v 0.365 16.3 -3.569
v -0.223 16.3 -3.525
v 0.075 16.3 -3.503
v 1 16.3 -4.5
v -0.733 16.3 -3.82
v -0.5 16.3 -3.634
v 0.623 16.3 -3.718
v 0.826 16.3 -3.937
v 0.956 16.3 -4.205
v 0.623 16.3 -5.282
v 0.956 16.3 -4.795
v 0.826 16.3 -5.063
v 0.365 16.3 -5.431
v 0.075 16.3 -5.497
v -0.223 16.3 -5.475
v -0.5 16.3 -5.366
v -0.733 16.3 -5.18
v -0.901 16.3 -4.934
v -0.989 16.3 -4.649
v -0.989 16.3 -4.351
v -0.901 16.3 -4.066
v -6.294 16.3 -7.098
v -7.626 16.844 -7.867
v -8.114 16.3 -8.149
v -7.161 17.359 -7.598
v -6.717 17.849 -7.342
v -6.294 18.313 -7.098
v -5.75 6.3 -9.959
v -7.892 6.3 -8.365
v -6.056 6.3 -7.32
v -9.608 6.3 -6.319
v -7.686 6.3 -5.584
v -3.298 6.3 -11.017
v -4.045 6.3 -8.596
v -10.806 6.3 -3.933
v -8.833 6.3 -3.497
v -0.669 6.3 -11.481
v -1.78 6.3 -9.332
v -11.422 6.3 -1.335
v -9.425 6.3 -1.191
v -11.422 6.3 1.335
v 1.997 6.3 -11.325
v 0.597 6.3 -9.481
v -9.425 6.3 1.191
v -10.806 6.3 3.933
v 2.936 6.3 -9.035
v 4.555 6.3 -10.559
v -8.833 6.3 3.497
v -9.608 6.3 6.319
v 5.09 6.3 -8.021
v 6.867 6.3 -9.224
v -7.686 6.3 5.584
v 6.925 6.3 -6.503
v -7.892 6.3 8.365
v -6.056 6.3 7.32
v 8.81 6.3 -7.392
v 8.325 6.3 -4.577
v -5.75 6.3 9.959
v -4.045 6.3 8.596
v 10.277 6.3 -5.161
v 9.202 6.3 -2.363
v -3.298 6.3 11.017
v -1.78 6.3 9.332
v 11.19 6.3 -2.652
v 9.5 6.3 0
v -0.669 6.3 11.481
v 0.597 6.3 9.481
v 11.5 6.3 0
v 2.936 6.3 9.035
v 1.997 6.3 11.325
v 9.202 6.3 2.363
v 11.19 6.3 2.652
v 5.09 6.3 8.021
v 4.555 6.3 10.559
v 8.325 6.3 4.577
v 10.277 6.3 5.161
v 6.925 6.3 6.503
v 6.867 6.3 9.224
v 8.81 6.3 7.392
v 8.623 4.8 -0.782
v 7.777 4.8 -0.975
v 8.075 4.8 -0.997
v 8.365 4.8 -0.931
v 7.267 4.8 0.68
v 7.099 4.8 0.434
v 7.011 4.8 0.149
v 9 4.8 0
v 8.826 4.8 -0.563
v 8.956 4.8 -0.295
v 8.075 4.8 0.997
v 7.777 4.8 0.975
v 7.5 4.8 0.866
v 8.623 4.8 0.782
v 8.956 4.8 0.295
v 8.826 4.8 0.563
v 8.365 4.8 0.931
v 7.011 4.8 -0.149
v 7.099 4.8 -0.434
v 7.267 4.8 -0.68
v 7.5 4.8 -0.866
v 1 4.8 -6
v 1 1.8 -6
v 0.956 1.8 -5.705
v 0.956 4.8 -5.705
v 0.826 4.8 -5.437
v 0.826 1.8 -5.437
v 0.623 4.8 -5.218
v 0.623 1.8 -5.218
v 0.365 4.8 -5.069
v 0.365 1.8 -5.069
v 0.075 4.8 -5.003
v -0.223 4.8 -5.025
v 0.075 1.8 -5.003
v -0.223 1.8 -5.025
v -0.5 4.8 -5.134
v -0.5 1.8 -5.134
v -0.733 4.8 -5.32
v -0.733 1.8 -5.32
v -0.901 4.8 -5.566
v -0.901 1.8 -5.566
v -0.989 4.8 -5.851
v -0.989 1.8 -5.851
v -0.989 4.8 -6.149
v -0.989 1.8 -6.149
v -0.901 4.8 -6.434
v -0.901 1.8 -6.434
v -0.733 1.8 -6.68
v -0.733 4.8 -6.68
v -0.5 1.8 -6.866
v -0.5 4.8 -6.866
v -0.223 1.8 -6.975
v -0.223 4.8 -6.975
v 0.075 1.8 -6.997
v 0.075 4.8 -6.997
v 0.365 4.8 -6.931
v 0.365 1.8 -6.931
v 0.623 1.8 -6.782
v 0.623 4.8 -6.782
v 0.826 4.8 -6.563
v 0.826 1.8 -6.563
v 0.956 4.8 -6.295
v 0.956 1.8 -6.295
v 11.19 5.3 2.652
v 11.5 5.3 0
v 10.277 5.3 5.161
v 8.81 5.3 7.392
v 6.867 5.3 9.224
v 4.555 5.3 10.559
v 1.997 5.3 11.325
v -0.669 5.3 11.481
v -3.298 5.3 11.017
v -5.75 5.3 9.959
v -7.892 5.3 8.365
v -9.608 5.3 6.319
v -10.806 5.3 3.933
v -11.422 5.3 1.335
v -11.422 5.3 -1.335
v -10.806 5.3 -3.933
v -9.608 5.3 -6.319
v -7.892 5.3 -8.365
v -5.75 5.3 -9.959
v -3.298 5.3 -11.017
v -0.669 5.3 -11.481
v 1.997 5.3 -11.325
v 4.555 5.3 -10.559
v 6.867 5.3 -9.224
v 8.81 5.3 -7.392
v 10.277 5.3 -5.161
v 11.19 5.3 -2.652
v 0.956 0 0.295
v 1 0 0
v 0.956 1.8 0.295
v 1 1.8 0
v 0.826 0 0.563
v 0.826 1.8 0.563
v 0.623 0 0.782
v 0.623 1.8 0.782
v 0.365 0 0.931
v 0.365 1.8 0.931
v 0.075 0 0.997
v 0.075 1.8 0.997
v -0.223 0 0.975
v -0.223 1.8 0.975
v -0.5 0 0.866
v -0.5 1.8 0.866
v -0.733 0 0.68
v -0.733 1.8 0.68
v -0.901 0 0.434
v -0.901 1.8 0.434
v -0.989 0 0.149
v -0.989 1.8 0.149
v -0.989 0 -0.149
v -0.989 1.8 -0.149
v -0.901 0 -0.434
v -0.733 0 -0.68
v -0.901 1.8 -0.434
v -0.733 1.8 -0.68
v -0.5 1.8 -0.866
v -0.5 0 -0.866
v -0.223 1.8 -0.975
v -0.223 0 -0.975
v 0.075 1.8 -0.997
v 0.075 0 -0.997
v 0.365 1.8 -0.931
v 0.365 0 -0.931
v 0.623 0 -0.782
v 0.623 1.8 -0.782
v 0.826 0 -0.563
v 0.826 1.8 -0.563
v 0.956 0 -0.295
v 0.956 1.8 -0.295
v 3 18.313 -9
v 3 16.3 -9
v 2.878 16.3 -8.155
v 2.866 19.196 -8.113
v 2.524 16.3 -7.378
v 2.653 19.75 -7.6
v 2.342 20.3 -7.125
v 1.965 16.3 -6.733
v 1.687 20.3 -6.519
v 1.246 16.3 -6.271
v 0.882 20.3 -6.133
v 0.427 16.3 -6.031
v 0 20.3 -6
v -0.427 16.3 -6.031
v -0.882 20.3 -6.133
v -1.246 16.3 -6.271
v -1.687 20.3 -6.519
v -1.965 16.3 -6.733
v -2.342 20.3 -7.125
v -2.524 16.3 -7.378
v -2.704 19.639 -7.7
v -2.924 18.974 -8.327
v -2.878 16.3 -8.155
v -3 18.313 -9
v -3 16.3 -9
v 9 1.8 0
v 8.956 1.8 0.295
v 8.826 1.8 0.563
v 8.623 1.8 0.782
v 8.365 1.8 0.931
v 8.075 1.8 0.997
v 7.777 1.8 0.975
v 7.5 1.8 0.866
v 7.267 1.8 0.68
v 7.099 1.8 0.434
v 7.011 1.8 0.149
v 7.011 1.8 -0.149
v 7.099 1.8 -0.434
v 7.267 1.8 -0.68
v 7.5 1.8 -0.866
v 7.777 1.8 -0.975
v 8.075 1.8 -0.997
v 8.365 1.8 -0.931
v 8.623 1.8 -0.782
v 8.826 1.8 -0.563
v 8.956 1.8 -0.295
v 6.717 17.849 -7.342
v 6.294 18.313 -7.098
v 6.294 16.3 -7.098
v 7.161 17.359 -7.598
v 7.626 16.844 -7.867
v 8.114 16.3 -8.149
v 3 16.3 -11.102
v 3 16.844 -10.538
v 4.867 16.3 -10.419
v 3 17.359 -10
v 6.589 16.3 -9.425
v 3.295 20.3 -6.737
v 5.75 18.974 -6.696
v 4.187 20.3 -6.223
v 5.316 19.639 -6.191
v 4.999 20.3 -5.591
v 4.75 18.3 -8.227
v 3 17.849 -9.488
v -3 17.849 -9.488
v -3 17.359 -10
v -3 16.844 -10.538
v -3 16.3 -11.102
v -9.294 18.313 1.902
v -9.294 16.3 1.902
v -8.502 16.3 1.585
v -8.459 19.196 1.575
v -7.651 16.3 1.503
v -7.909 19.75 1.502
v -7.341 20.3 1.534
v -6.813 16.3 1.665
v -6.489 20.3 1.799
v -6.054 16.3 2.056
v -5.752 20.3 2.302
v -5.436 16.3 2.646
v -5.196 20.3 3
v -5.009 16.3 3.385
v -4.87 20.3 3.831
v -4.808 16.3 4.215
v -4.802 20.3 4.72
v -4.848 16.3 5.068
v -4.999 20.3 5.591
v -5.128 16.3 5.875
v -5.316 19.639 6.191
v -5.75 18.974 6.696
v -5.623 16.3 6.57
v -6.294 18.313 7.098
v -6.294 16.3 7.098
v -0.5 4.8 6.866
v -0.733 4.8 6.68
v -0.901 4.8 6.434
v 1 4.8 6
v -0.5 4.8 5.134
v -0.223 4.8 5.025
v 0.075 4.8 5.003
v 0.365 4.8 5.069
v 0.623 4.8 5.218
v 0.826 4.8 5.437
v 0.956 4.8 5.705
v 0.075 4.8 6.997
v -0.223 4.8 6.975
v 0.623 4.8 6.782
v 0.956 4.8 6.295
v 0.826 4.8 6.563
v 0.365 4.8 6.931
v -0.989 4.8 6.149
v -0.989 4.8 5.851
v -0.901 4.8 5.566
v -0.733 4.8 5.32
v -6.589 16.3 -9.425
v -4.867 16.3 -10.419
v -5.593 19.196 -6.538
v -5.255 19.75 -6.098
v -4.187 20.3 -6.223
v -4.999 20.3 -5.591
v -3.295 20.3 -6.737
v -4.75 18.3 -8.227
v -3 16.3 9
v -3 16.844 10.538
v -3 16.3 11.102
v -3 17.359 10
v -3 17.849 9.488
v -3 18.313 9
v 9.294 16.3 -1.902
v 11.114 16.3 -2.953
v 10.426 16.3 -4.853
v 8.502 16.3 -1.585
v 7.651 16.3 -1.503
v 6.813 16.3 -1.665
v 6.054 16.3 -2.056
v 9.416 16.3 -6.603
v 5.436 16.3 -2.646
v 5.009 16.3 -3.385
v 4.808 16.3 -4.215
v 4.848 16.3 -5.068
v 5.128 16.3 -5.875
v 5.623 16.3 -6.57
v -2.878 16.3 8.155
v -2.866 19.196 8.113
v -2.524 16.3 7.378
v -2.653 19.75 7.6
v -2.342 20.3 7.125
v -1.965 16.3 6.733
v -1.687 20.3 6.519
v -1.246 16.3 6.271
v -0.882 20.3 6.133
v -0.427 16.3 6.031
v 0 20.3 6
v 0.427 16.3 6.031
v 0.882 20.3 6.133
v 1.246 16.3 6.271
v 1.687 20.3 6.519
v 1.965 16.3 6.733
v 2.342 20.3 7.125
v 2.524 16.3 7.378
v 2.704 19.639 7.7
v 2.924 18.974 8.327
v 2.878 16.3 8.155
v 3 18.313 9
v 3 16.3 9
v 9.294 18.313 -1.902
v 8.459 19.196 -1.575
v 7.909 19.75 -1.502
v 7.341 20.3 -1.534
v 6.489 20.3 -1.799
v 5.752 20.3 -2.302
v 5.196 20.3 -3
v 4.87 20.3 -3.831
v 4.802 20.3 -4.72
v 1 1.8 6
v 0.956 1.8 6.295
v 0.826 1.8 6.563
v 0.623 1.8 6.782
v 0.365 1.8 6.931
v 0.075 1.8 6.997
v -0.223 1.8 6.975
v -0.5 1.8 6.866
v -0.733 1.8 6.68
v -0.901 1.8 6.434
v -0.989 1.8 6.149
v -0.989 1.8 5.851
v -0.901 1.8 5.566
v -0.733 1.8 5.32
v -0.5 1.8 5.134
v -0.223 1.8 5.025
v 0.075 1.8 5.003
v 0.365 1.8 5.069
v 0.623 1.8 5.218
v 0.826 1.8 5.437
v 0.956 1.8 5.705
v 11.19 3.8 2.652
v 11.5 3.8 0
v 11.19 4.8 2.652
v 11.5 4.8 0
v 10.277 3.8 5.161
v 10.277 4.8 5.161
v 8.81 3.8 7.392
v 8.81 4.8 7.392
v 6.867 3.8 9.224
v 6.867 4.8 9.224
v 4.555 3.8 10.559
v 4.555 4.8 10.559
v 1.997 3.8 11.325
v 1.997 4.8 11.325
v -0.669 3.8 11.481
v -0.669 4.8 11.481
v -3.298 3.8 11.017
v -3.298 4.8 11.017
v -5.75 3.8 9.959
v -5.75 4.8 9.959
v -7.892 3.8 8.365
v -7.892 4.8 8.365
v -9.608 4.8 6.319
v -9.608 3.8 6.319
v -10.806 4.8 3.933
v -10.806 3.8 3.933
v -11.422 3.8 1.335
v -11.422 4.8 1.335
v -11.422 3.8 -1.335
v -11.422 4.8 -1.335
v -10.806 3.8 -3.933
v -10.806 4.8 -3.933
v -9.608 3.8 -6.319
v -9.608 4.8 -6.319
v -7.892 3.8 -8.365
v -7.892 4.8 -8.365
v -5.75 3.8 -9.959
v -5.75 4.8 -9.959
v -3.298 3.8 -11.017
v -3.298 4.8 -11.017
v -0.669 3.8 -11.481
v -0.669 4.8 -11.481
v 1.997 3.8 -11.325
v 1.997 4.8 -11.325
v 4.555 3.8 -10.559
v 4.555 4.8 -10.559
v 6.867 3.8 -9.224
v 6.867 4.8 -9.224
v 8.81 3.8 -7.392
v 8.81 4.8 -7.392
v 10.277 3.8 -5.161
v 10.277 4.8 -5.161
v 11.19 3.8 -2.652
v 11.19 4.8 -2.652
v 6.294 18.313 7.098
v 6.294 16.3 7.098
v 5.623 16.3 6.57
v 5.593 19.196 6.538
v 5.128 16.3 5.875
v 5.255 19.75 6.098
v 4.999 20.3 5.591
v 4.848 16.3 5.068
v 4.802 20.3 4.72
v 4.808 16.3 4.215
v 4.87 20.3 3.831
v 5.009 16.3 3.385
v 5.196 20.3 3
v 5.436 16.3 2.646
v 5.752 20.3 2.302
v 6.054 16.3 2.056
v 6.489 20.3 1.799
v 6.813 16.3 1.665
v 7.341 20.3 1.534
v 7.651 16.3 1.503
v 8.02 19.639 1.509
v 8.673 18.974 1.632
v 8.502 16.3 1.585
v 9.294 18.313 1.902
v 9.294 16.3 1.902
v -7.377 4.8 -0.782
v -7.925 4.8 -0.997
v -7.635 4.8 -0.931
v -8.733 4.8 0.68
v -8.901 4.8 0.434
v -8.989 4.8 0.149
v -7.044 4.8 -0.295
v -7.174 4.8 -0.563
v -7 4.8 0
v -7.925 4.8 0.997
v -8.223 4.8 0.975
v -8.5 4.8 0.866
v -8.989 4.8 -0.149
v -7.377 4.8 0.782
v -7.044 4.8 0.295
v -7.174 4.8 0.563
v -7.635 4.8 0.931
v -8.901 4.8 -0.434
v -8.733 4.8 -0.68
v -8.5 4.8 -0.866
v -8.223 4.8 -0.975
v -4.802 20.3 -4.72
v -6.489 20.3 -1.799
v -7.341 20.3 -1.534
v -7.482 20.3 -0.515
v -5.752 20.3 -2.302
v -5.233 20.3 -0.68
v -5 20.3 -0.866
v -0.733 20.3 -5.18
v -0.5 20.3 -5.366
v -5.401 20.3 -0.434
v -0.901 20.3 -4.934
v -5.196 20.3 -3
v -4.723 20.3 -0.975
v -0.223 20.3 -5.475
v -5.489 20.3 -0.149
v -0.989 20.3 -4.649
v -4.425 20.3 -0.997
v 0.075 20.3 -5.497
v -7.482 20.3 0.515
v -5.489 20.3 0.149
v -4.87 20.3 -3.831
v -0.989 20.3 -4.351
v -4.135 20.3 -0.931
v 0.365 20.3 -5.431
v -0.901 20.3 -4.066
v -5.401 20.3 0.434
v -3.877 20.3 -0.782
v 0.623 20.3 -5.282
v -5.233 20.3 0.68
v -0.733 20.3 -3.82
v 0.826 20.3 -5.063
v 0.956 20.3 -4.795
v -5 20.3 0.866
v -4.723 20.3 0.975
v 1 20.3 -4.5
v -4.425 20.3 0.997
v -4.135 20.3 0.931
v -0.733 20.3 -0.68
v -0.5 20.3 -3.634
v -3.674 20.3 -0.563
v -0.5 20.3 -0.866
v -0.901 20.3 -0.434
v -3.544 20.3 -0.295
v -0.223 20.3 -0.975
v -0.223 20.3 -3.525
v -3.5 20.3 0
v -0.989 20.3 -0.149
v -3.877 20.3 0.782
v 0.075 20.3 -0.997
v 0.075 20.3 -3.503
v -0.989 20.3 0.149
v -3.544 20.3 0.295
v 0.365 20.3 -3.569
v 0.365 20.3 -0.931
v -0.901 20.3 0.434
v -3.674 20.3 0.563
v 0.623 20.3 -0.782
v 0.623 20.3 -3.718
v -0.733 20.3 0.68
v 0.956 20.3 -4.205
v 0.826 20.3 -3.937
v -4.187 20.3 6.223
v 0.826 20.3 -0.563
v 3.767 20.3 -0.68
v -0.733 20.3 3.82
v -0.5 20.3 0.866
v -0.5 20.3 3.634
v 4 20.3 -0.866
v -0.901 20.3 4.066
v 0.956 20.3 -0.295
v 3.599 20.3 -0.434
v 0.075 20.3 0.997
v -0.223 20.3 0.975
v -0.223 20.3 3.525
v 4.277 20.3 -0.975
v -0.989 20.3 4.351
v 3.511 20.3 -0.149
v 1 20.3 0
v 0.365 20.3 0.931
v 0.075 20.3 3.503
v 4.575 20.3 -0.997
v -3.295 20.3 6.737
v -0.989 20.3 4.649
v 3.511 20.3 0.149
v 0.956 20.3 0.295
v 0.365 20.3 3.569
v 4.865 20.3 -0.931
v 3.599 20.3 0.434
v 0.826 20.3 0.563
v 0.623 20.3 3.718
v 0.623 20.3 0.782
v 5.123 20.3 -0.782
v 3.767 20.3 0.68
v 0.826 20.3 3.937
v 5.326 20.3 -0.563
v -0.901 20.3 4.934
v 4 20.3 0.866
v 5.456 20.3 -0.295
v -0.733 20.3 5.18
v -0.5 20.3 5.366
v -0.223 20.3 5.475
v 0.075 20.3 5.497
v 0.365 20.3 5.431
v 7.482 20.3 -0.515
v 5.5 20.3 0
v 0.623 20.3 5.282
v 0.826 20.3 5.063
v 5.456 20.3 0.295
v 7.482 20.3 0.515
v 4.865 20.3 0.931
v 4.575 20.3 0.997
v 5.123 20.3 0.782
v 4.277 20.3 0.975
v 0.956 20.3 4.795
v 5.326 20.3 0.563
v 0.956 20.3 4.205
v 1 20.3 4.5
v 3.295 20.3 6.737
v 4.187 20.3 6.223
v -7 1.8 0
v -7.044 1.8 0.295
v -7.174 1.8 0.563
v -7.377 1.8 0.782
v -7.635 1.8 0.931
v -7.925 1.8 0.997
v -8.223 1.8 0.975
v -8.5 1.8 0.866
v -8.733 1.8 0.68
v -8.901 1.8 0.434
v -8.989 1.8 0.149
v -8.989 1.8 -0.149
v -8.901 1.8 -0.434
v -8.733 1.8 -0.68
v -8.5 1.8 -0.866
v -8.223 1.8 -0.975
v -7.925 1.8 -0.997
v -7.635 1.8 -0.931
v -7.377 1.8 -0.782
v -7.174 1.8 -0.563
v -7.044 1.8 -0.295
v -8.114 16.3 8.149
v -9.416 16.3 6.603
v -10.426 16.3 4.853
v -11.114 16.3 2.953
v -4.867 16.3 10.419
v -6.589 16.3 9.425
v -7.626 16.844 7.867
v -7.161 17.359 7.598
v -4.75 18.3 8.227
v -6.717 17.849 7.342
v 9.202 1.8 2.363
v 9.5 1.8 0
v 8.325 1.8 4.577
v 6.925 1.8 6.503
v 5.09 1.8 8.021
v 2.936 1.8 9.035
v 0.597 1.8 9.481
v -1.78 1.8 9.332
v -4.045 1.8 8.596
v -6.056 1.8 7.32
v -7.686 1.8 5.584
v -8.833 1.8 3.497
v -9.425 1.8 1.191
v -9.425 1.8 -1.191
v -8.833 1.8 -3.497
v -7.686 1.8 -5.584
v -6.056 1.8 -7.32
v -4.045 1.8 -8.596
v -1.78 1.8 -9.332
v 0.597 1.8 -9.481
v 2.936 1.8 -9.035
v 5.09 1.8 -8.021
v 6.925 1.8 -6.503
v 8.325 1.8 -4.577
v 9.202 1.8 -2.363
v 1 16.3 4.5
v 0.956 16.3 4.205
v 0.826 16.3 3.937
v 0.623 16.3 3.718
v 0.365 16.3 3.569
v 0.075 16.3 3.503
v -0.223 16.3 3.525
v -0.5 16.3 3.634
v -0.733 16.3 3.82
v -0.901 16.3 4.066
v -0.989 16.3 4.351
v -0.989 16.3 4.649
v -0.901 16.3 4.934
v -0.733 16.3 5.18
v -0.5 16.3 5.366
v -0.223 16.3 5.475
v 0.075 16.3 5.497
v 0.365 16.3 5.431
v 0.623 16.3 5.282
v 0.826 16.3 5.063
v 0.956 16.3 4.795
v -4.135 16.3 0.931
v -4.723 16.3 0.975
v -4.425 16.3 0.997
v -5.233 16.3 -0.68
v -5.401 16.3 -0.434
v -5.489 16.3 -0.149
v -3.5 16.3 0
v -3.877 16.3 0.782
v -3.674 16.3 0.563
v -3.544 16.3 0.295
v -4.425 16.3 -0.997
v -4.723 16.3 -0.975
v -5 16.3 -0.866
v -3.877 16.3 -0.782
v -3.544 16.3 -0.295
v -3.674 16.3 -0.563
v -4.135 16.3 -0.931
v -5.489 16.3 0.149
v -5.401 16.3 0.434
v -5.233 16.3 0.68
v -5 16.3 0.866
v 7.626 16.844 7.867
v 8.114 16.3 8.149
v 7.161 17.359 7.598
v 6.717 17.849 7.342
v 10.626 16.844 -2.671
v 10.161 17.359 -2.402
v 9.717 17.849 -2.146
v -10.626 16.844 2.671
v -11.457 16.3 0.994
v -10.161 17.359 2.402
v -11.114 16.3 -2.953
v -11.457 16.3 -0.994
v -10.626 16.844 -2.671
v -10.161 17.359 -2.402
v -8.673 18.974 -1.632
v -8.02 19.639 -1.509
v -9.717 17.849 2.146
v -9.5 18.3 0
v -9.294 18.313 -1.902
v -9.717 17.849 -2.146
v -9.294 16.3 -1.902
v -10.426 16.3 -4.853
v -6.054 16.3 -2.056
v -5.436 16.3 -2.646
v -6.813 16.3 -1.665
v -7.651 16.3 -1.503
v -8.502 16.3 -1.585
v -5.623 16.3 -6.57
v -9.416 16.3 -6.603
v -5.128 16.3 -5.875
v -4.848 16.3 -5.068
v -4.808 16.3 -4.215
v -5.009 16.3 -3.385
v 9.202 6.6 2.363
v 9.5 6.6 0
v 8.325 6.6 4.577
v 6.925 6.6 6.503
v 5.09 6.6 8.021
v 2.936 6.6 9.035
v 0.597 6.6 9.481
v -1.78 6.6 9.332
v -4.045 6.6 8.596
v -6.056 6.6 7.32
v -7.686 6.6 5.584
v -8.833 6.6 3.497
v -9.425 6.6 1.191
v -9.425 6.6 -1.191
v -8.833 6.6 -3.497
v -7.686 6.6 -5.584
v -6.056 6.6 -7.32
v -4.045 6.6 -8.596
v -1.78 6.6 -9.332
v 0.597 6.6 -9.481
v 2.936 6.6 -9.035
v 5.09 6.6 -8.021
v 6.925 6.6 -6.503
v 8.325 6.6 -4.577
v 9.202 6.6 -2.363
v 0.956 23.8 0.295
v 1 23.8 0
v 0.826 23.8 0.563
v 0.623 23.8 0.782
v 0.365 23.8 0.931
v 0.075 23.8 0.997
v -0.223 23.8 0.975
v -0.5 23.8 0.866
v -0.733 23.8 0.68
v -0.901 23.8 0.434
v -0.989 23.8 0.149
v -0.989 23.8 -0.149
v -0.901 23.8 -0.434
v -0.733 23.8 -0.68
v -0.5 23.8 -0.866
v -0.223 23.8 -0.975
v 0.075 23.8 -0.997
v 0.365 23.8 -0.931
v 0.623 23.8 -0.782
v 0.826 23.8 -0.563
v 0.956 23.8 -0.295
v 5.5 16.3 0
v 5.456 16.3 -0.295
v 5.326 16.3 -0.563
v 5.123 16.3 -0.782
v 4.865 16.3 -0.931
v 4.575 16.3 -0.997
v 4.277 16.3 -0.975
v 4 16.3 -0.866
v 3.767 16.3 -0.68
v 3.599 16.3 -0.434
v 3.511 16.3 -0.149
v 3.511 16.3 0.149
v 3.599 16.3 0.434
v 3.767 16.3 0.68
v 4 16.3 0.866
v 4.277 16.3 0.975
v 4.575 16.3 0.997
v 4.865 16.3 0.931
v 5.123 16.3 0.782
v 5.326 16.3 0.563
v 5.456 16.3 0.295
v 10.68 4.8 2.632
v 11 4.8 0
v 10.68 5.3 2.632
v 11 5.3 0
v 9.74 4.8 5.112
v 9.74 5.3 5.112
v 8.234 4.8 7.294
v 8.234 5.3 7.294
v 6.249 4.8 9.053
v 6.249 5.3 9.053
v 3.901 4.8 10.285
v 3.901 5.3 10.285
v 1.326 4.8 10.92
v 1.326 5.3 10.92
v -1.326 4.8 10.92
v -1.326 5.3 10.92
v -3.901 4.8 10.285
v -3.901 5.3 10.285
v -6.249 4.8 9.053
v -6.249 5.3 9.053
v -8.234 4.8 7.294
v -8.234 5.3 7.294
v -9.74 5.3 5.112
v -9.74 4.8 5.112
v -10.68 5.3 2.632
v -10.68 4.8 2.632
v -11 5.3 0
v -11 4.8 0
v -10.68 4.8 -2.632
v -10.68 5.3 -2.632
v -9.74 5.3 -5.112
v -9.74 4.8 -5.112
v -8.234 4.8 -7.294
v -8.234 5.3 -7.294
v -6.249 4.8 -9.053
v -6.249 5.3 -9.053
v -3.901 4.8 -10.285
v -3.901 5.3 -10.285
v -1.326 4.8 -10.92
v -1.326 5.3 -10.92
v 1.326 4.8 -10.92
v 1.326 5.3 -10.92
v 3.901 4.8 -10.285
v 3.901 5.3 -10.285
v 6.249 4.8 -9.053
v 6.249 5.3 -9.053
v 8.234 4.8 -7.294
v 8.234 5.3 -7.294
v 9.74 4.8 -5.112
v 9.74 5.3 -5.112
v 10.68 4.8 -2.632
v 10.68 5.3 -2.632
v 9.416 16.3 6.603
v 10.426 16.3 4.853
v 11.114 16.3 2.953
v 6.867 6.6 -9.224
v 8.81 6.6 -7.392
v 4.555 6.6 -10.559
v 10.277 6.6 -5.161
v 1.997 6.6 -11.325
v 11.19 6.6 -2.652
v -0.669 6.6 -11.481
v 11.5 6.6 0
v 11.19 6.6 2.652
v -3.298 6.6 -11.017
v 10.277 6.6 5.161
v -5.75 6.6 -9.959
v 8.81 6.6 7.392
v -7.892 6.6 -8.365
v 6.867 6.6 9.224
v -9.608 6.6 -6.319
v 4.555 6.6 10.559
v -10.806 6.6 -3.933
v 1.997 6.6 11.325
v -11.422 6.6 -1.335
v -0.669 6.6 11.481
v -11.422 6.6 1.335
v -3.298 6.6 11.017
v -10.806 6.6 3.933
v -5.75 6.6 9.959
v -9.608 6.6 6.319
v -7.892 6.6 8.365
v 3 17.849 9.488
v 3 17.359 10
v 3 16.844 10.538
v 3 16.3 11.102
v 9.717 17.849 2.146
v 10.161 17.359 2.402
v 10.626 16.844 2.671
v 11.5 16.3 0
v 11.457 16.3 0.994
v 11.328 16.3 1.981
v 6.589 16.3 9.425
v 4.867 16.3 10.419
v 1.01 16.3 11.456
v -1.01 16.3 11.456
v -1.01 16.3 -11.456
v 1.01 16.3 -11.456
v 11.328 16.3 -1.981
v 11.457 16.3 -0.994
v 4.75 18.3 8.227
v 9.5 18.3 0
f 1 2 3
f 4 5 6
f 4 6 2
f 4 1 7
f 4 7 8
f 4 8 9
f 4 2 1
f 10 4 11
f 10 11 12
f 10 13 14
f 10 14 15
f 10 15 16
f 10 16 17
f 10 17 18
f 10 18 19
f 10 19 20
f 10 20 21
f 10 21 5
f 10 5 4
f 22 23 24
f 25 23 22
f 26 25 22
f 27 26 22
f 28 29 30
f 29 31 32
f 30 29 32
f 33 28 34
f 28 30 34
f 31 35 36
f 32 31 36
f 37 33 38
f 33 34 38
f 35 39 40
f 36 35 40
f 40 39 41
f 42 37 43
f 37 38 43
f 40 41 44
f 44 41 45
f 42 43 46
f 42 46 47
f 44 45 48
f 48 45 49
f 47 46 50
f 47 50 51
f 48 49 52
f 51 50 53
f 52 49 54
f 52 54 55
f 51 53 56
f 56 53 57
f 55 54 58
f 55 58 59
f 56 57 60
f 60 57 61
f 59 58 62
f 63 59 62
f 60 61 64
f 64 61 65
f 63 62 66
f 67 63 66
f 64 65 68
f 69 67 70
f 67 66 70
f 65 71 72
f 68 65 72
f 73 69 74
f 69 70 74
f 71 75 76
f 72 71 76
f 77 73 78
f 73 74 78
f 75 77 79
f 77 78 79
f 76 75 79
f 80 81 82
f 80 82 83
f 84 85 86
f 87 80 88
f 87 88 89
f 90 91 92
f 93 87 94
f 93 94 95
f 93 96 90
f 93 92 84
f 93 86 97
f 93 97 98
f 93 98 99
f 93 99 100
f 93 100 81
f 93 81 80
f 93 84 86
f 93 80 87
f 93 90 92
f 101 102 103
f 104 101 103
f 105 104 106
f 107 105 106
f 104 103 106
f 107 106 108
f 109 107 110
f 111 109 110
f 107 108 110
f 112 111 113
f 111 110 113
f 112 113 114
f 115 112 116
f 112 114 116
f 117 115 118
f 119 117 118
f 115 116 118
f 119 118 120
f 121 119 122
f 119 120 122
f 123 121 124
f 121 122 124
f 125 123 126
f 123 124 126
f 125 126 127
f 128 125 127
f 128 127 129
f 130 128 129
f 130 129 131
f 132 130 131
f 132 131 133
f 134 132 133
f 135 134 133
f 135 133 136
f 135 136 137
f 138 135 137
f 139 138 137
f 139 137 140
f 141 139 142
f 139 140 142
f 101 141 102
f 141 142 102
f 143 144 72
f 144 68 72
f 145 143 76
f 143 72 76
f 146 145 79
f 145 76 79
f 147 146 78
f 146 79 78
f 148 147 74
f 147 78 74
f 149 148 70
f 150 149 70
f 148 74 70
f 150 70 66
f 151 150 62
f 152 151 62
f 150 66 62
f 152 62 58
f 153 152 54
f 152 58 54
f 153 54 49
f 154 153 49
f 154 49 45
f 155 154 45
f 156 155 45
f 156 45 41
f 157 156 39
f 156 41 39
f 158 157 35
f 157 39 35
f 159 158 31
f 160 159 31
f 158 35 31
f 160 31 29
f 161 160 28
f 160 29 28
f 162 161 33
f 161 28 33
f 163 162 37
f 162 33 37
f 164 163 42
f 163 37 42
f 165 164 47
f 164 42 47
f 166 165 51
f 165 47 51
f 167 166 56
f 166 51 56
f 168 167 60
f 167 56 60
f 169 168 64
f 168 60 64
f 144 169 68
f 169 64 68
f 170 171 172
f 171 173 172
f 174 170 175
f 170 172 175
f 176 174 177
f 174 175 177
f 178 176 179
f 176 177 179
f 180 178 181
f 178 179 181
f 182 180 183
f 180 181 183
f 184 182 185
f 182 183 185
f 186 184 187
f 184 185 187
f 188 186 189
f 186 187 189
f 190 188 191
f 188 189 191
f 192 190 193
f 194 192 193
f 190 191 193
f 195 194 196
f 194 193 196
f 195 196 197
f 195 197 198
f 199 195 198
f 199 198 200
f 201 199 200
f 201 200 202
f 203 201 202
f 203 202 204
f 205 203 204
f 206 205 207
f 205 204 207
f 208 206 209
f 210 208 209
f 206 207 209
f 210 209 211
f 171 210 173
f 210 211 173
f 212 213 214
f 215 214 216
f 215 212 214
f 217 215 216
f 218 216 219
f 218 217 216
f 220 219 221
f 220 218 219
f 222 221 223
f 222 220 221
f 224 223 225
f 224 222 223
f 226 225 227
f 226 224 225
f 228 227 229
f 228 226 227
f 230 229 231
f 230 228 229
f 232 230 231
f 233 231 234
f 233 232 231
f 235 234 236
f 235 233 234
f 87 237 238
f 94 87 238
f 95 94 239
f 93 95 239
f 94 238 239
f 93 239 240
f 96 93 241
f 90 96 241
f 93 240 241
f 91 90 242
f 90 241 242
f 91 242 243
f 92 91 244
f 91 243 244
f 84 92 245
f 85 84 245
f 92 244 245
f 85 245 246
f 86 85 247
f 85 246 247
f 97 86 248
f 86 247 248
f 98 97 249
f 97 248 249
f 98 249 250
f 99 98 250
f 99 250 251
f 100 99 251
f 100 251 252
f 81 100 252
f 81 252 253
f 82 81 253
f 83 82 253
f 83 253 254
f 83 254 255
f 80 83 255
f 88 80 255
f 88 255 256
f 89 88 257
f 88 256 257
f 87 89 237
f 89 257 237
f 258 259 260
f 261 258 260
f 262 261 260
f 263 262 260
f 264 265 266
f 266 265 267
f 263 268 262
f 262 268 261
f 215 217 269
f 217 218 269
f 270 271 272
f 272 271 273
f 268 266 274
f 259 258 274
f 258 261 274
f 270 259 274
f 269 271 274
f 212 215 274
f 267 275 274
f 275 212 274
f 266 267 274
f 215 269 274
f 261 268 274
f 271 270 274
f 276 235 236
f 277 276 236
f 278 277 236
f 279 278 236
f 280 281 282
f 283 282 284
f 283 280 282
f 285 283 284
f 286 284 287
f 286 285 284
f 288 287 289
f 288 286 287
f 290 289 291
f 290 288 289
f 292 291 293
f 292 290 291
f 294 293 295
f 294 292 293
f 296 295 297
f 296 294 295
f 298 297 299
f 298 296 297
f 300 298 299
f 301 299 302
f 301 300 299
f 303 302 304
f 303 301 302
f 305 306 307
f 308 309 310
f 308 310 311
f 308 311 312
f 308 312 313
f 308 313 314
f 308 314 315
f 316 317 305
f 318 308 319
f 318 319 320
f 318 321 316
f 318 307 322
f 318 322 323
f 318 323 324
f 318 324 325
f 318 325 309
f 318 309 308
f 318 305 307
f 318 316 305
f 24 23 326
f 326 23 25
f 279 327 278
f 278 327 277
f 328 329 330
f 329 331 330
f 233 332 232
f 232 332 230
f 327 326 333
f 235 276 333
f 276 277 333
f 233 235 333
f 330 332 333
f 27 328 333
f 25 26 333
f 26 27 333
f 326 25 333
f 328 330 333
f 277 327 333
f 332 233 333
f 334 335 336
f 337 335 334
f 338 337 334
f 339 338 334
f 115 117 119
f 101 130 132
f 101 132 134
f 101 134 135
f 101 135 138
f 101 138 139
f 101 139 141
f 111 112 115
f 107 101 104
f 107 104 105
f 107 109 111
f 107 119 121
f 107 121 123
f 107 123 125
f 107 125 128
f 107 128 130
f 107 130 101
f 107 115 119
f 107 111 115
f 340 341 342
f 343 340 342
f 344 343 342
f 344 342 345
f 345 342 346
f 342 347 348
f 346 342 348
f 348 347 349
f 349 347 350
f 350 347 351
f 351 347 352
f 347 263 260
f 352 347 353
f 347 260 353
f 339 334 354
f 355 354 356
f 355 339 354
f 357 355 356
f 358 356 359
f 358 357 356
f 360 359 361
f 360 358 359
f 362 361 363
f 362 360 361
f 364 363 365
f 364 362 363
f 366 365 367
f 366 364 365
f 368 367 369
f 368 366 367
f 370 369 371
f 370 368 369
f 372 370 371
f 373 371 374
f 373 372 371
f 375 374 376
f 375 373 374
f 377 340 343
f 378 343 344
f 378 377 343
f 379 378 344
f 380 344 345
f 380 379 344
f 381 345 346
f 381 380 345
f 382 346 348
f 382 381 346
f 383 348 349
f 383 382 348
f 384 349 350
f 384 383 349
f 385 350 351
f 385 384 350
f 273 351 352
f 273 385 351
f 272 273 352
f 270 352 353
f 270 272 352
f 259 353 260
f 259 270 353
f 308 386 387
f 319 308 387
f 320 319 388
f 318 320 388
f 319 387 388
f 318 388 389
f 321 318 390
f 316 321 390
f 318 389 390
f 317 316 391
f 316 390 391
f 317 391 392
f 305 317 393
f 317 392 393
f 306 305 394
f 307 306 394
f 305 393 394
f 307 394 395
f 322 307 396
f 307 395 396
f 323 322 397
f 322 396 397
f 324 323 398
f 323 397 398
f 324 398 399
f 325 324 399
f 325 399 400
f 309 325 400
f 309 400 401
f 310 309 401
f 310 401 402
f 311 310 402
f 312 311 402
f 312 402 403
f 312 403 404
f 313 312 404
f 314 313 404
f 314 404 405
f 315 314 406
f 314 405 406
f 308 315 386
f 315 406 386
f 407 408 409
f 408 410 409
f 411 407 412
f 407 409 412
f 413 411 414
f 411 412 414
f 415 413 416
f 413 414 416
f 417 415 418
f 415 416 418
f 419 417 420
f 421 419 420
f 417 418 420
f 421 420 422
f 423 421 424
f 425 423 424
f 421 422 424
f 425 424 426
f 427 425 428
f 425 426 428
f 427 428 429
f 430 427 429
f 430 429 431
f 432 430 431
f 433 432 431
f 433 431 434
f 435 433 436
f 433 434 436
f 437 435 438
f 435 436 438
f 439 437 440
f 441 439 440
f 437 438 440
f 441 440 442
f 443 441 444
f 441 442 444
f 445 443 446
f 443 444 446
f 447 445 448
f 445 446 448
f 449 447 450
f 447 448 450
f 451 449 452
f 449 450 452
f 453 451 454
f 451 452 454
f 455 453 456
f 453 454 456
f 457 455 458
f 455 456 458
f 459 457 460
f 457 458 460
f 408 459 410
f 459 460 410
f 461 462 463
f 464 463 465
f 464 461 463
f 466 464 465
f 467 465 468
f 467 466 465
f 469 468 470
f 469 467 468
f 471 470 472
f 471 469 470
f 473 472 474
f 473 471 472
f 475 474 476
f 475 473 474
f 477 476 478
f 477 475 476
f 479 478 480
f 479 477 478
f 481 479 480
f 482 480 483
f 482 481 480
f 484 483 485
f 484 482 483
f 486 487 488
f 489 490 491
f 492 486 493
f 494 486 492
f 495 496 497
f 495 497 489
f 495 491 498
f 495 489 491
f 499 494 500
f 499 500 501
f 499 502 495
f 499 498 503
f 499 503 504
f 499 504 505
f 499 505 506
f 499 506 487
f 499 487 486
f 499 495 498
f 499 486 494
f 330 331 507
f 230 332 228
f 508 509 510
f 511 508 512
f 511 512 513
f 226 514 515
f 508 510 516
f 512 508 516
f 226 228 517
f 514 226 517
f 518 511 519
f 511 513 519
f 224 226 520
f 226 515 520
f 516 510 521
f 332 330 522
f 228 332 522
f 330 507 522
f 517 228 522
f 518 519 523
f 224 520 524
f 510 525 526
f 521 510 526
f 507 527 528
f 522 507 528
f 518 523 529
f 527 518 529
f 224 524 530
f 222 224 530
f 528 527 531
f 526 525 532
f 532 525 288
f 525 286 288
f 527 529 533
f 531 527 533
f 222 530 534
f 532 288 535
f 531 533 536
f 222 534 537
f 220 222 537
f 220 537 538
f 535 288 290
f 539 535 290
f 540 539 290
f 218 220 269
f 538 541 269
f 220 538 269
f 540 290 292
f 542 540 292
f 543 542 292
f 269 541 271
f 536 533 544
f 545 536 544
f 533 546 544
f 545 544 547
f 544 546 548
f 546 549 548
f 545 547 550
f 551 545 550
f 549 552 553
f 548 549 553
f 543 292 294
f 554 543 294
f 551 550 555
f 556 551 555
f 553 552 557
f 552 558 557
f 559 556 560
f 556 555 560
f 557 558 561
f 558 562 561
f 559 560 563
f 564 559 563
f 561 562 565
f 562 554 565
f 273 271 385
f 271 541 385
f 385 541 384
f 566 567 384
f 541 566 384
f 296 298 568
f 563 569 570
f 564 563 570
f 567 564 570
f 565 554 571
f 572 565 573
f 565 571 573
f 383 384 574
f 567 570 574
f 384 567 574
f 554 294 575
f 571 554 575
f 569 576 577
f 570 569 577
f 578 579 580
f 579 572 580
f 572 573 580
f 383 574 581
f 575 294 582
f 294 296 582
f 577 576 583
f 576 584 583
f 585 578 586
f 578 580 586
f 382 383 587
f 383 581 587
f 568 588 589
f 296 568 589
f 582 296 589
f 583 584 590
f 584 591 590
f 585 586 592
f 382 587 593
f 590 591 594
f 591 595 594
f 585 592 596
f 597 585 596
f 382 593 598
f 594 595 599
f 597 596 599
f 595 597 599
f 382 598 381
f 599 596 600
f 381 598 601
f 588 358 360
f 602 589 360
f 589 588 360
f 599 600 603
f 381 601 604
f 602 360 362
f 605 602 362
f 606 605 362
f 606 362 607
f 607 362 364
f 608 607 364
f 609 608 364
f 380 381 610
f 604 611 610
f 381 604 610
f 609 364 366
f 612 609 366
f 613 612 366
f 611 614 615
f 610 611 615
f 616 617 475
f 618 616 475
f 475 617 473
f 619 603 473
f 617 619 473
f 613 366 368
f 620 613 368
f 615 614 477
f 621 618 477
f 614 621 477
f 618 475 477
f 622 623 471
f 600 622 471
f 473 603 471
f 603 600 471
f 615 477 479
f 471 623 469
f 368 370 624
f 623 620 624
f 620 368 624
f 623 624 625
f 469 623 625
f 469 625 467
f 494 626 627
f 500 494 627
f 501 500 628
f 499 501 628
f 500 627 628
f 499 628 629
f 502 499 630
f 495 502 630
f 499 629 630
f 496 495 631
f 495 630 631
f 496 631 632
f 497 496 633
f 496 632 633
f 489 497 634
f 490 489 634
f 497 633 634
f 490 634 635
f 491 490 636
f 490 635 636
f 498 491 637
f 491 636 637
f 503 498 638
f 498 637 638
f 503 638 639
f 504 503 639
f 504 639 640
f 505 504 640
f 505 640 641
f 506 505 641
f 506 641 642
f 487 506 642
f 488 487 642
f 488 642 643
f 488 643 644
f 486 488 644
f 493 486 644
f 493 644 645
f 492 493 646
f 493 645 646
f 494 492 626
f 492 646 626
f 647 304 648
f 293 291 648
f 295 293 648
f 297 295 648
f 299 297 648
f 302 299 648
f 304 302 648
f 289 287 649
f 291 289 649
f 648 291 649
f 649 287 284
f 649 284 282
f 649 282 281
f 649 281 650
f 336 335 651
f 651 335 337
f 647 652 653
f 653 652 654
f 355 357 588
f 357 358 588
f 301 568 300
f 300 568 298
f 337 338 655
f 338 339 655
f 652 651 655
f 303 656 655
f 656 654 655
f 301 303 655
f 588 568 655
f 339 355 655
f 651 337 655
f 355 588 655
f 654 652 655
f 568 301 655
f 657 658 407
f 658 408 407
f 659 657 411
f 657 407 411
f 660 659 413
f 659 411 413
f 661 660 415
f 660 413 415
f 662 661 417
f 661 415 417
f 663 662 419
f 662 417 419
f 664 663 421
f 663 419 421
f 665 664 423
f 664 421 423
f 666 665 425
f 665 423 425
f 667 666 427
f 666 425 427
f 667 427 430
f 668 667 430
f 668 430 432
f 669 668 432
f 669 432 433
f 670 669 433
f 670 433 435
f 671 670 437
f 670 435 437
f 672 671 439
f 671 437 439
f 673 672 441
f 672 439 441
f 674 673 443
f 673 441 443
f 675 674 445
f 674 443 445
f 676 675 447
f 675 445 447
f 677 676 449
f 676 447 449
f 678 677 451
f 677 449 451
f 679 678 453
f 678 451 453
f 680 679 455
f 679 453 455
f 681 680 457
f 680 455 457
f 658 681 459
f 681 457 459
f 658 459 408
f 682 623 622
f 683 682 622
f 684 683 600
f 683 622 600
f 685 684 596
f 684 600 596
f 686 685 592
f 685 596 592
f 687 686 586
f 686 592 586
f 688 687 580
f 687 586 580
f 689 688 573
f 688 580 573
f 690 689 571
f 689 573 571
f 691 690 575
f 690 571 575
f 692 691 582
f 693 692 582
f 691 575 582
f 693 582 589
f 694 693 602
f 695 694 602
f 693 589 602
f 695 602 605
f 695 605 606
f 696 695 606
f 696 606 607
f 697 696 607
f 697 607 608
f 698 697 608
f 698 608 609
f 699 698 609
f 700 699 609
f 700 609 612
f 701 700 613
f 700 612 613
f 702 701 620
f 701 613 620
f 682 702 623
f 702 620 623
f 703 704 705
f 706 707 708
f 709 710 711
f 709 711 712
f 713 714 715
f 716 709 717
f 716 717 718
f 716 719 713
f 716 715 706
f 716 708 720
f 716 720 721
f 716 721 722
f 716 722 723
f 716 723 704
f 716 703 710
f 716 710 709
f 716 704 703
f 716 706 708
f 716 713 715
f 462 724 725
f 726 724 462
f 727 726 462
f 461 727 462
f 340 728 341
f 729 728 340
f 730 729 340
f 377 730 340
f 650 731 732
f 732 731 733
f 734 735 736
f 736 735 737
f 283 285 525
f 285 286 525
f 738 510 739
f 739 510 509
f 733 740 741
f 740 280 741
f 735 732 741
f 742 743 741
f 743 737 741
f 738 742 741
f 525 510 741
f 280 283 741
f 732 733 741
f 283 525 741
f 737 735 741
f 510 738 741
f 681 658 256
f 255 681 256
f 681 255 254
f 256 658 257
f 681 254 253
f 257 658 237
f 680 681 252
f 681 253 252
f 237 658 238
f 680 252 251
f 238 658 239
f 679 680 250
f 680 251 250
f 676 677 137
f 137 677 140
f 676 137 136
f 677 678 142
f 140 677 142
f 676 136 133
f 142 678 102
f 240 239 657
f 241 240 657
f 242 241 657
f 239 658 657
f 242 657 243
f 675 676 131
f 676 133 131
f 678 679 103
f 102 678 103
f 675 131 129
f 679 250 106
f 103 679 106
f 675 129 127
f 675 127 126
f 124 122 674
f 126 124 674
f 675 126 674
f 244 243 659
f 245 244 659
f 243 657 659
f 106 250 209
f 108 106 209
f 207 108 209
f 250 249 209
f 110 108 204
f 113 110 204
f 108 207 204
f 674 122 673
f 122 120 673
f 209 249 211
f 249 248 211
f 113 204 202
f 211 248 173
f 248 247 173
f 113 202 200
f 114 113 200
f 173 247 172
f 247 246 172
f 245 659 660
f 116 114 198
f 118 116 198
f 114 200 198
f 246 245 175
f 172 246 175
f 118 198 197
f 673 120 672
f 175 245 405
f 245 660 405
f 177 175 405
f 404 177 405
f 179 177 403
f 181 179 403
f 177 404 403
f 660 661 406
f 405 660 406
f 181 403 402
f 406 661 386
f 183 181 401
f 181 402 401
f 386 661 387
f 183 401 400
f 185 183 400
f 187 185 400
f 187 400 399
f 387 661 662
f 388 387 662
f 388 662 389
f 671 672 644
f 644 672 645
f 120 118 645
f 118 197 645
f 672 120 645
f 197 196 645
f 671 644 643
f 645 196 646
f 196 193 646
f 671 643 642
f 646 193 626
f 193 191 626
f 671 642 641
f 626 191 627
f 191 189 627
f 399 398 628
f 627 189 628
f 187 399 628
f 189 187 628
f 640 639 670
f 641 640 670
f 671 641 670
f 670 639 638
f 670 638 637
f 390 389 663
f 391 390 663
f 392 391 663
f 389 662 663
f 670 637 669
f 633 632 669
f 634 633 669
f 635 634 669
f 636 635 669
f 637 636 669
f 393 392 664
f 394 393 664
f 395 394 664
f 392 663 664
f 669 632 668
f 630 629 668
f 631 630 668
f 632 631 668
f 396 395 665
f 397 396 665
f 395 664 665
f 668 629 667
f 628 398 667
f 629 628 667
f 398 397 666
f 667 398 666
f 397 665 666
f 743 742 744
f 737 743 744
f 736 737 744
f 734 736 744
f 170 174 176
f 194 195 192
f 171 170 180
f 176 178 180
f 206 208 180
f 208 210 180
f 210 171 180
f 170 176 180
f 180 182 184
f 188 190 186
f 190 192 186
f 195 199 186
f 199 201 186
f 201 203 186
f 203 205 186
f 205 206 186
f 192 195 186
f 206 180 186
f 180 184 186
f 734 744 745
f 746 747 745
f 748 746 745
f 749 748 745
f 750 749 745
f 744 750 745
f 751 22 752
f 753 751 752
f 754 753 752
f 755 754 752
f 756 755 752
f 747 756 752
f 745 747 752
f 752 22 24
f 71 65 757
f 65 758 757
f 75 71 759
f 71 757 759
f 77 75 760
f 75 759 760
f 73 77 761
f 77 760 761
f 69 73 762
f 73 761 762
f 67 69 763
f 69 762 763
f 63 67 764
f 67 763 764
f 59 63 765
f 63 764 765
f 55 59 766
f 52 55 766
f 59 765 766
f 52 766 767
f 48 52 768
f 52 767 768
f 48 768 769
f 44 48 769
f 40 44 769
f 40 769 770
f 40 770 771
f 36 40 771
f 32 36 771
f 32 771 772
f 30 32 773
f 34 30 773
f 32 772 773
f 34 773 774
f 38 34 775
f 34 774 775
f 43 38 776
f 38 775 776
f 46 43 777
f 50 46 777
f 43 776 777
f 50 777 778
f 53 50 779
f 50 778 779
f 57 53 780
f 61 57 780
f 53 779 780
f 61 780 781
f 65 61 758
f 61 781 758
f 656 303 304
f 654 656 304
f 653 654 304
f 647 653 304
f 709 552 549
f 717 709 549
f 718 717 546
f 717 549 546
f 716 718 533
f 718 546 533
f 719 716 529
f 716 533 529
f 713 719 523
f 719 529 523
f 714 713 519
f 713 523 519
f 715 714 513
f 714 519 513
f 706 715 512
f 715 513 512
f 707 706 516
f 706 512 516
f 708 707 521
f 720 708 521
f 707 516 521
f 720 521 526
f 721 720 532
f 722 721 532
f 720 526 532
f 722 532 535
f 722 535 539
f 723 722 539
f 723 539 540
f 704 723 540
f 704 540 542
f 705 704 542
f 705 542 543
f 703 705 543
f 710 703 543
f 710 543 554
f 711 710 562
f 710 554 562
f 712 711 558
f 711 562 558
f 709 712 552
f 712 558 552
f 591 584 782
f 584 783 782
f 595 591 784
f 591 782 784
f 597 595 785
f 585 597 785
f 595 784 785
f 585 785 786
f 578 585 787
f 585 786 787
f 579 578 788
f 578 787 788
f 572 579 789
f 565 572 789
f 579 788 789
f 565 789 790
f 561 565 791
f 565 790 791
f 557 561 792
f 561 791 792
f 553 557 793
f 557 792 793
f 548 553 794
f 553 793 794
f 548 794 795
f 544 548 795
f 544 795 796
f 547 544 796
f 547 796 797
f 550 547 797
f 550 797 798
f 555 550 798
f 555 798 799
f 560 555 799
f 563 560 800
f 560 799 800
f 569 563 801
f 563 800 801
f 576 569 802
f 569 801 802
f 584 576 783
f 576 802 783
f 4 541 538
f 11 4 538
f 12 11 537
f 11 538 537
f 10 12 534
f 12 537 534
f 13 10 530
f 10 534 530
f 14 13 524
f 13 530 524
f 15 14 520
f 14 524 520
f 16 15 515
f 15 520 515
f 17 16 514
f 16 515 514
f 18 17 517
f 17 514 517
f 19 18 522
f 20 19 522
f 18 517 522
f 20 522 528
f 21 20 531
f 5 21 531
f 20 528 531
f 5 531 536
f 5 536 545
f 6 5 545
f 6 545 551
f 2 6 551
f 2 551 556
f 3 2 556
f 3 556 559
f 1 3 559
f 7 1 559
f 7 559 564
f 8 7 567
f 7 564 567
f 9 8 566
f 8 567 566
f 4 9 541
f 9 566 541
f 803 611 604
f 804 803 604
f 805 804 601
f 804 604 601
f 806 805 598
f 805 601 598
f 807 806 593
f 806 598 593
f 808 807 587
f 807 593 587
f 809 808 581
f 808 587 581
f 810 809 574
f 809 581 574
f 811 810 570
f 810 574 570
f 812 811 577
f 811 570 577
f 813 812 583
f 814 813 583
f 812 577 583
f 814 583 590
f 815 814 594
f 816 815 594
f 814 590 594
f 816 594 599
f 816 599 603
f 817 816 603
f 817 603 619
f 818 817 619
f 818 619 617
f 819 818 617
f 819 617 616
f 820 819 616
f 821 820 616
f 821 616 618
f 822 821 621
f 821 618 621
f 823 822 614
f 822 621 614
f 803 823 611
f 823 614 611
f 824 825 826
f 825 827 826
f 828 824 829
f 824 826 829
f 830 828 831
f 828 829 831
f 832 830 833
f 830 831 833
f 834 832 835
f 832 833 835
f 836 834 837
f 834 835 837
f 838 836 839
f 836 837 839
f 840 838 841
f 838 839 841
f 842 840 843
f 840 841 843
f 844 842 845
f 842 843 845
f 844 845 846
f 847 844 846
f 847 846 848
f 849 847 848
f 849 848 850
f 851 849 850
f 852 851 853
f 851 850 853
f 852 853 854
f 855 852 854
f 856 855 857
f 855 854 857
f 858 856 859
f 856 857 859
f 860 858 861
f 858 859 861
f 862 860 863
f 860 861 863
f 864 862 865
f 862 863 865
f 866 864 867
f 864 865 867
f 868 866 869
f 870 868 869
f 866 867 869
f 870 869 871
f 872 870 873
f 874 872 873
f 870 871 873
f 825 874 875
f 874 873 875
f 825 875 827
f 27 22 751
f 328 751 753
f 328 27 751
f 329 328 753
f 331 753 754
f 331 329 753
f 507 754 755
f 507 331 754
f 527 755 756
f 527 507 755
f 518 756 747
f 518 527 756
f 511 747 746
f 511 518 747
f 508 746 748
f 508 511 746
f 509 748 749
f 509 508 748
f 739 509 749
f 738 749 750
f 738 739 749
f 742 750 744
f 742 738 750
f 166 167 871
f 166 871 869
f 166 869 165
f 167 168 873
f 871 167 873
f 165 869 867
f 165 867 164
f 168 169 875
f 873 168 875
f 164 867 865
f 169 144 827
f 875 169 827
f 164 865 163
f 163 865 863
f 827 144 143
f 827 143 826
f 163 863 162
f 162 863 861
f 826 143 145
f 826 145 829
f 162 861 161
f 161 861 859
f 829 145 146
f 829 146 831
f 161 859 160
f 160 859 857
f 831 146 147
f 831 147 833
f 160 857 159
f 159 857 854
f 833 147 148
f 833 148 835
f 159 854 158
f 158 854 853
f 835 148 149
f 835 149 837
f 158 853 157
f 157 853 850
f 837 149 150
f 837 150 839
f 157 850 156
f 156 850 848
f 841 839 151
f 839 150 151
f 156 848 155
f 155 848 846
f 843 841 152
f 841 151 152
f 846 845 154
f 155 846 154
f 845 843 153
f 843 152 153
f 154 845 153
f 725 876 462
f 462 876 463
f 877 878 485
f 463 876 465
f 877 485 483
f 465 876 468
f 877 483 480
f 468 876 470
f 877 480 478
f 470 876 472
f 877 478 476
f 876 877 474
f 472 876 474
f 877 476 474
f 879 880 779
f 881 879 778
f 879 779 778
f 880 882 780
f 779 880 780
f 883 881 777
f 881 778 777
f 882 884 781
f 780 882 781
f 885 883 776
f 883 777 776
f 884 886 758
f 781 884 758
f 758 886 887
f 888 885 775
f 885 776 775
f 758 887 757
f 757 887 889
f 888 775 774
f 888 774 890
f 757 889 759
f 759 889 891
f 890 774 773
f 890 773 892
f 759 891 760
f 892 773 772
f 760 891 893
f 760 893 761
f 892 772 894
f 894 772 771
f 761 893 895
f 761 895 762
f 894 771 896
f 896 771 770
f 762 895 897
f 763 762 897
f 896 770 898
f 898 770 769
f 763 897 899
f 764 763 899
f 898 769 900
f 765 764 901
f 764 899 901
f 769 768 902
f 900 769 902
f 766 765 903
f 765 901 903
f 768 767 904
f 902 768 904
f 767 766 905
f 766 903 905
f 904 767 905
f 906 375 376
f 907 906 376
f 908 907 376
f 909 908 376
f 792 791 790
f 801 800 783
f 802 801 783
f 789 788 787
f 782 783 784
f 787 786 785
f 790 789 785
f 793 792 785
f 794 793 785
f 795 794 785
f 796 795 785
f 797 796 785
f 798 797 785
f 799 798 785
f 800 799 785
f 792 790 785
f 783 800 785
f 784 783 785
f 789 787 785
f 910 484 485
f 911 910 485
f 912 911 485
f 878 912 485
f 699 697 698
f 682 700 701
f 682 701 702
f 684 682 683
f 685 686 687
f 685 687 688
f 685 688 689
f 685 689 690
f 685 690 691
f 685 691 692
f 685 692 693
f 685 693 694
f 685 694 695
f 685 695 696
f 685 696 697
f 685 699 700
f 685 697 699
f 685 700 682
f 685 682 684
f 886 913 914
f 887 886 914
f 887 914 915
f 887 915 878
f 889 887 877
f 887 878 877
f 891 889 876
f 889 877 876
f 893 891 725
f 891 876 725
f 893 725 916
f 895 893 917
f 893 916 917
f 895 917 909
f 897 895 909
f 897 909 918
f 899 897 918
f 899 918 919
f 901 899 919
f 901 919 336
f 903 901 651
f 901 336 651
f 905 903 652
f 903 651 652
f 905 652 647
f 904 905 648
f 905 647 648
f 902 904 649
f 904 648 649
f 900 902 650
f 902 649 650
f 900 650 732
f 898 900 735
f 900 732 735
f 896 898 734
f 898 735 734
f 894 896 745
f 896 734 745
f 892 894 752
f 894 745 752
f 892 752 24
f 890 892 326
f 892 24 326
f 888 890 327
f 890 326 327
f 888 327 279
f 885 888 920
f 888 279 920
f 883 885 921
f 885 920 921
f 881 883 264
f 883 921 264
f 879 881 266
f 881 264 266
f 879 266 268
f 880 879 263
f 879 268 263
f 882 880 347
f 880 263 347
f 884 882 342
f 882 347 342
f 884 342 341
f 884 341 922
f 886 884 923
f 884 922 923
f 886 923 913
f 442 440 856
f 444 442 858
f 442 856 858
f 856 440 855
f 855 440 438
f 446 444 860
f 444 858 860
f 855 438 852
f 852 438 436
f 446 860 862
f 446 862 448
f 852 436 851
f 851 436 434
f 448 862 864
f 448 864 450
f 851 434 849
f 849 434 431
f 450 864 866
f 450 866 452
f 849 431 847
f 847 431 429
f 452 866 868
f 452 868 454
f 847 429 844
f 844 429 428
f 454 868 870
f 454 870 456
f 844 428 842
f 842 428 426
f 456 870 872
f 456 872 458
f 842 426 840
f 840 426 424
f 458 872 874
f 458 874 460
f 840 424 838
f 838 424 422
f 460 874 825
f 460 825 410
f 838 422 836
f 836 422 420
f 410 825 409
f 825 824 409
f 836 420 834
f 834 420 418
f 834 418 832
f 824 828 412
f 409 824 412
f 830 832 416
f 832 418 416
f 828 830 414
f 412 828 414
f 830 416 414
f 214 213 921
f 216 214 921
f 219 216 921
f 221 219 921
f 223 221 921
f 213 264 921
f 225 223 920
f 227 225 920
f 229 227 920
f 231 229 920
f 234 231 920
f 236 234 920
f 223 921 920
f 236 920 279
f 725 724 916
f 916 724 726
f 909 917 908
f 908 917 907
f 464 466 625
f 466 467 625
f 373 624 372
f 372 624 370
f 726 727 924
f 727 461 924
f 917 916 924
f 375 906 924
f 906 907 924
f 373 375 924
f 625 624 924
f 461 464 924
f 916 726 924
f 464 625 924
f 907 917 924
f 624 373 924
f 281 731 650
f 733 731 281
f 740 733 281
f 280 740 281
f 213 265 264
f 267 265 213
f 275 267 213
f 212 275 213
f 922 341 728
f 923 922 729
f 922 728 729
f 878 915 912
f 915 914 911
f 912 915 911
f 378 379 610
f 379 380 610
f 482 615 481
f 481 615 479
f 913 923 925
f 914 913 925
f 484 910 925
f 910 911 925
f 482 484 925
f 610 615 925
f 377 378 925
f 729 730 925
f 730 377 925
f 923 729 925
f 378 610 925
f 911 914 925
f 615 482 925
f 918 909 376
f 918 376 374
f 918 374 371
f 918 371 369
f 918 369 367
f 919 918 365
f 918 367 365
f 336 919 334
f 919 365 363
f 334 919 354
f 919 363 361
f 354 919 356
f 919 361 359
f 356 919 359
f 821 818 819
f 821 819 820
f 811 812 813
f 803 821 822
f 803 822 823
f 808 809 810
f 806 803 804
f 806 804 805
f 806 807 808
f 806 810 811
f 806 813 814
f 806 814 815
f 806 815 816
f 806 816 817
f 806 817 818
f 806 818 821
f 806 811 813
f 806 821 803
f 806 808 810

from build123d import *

# Parameters (mm, degrees)
SKETCH3_R          = 1
CUT_EXTRUDE1_DEPTH = 4
SKETCH4_R          = 1
CUT_EXTRUDE2_DEPTH = 3


with BuildPart() as part:
    # Sketch2 → Revolve2 (revolve)
    with BuildSketch(Plane.XY):
        Polygon((1, 23.8), (0, 23.8), (0, 0), (1, 0), (1, 1.8), (9.5, 1.8), (11.5, 3.8), (11.5, 4.8), (11, 4.8), (11, 5.3), (11.5, 5.3), (11.5, 6.3), (9.5, 6.3), (9.5, 6.6), (11.5, 6.6), (11.5, 16.3), (7.5, 20.3), (1, 20.3), align=None)
    revolve(axis=Axis((0, 23.8, 0), (0, -1, 0)))

    # Sketch3 → Cut-Extrude1 (cut)
    with BuildSketch(Plane(origin=(0, 20.3, 0), x_dir=(1, 0, 0), z_dir=(0, 1, 0))):
        with Locations((0, 4.5)):
            Circle(SKETCH3_R)
        with Locations((0, -4.5)):
            Circle(SKETCH3_R)
        with Locations((4.5, 0)):
            Circle(SKETCH3_R)
        with Locations((-4.5, 0)):
            Circle(SKETCH3_R)
        with BuildLine():
            Line((-3, 9), (-3, 17.274276686))
            Line((-3, 17.274276686), (3, 17.274276686))
            Line((3, 17.274276686), (3, 9))
            ThreePointArc((3, 9), (0, 6), (-3, 9))
        make_face()
        with BuildLine():
            Line((13.459962442, 11.235214554), (16.459962442, 6.039062131))
            Line((16.459962442, 6.039062131), (9.294228634, 1.901923789))
            ThreePointArc((9.294228634, 1.901923789), (5.196152423, 3), (6.294228634, 7.098076211))
            Line((6.294228634, 7.098076211), (13.459962442, 11.235214554))
        make_face()
        with BuildLine():
            Line((16.459962442, -6.039062131), (13.459962442, -11.235214554))
            Line((13.459962442, -11.235214554), (6.294228634, -7.098076211))
            ThreePointArc((6.294228634, -7.098076211), (5.196152423, -3), (9.294228634, -1.901923789))
            Line((9.294228634, -1.901923789), (16.459962442, -6.039062131))
        make_face()
        with BuildLine():
            Line((3, -17.274276686), (-3, -17.274276686))
            Line((-3, -17.274276686), (-3, -9))
            ThreePointArc((-3, -9), (0, -6), (3, -9))
            Line((3, -9), (3, -17.274276686))
        make_face()
        with BuildLine():
            Line((-13.459962442, -11.235214554), (-16.459962442, -6.039062131))
            Line((-16.459962442, -6.039062131), (-9.294228634, -1.901923789))
            ThreePointArc((-9.294228634, -1.901923789), (-5.196152423, -3), (-6.294228634, -7.098076211))
            Line((-6.294228634, -7.098076211), (-13.459962442, -11.235214554))
        make_face()
        with BuildLine():
            Line((-16.459962442, 6.039062131), (-13.459962442, 11.235214554))
            Line((-13.459962442, 11.235214554), (-6.294228634, 7.098076211))
            ThreePointArc((-6.294228634, 7.098076211), (-5.196152423, 3), (-9.294228634, 1.901923789))
            Line((-9.294228634, 1.901923789), (-16.459962442, 6.039062131))
        make_face()
    extrude(amount=-CUT_EXTRUDE1_DEPTH, mode=Mode.SUBTRACT)

    # Sketch4 → Cut-Extrude2 (cut)
    with BuildSketch(Plane.XZ.offset(-1.8)):
        with Locations((0, 6)):
            Circle(SKETCH4_R)
        with Locations((8, 0)):
            Circle(SKETCH4_R)
        with Locations((0, -6)):
            Circle(SKETCH4_R)
        with Locations((-8, 0)):
            Circle(SKETCH4_R)
    extrude(amount=-CUT_EXTRUDE2_DEPTH, mode=Mode.SUBTRACT)


solid = part.part
